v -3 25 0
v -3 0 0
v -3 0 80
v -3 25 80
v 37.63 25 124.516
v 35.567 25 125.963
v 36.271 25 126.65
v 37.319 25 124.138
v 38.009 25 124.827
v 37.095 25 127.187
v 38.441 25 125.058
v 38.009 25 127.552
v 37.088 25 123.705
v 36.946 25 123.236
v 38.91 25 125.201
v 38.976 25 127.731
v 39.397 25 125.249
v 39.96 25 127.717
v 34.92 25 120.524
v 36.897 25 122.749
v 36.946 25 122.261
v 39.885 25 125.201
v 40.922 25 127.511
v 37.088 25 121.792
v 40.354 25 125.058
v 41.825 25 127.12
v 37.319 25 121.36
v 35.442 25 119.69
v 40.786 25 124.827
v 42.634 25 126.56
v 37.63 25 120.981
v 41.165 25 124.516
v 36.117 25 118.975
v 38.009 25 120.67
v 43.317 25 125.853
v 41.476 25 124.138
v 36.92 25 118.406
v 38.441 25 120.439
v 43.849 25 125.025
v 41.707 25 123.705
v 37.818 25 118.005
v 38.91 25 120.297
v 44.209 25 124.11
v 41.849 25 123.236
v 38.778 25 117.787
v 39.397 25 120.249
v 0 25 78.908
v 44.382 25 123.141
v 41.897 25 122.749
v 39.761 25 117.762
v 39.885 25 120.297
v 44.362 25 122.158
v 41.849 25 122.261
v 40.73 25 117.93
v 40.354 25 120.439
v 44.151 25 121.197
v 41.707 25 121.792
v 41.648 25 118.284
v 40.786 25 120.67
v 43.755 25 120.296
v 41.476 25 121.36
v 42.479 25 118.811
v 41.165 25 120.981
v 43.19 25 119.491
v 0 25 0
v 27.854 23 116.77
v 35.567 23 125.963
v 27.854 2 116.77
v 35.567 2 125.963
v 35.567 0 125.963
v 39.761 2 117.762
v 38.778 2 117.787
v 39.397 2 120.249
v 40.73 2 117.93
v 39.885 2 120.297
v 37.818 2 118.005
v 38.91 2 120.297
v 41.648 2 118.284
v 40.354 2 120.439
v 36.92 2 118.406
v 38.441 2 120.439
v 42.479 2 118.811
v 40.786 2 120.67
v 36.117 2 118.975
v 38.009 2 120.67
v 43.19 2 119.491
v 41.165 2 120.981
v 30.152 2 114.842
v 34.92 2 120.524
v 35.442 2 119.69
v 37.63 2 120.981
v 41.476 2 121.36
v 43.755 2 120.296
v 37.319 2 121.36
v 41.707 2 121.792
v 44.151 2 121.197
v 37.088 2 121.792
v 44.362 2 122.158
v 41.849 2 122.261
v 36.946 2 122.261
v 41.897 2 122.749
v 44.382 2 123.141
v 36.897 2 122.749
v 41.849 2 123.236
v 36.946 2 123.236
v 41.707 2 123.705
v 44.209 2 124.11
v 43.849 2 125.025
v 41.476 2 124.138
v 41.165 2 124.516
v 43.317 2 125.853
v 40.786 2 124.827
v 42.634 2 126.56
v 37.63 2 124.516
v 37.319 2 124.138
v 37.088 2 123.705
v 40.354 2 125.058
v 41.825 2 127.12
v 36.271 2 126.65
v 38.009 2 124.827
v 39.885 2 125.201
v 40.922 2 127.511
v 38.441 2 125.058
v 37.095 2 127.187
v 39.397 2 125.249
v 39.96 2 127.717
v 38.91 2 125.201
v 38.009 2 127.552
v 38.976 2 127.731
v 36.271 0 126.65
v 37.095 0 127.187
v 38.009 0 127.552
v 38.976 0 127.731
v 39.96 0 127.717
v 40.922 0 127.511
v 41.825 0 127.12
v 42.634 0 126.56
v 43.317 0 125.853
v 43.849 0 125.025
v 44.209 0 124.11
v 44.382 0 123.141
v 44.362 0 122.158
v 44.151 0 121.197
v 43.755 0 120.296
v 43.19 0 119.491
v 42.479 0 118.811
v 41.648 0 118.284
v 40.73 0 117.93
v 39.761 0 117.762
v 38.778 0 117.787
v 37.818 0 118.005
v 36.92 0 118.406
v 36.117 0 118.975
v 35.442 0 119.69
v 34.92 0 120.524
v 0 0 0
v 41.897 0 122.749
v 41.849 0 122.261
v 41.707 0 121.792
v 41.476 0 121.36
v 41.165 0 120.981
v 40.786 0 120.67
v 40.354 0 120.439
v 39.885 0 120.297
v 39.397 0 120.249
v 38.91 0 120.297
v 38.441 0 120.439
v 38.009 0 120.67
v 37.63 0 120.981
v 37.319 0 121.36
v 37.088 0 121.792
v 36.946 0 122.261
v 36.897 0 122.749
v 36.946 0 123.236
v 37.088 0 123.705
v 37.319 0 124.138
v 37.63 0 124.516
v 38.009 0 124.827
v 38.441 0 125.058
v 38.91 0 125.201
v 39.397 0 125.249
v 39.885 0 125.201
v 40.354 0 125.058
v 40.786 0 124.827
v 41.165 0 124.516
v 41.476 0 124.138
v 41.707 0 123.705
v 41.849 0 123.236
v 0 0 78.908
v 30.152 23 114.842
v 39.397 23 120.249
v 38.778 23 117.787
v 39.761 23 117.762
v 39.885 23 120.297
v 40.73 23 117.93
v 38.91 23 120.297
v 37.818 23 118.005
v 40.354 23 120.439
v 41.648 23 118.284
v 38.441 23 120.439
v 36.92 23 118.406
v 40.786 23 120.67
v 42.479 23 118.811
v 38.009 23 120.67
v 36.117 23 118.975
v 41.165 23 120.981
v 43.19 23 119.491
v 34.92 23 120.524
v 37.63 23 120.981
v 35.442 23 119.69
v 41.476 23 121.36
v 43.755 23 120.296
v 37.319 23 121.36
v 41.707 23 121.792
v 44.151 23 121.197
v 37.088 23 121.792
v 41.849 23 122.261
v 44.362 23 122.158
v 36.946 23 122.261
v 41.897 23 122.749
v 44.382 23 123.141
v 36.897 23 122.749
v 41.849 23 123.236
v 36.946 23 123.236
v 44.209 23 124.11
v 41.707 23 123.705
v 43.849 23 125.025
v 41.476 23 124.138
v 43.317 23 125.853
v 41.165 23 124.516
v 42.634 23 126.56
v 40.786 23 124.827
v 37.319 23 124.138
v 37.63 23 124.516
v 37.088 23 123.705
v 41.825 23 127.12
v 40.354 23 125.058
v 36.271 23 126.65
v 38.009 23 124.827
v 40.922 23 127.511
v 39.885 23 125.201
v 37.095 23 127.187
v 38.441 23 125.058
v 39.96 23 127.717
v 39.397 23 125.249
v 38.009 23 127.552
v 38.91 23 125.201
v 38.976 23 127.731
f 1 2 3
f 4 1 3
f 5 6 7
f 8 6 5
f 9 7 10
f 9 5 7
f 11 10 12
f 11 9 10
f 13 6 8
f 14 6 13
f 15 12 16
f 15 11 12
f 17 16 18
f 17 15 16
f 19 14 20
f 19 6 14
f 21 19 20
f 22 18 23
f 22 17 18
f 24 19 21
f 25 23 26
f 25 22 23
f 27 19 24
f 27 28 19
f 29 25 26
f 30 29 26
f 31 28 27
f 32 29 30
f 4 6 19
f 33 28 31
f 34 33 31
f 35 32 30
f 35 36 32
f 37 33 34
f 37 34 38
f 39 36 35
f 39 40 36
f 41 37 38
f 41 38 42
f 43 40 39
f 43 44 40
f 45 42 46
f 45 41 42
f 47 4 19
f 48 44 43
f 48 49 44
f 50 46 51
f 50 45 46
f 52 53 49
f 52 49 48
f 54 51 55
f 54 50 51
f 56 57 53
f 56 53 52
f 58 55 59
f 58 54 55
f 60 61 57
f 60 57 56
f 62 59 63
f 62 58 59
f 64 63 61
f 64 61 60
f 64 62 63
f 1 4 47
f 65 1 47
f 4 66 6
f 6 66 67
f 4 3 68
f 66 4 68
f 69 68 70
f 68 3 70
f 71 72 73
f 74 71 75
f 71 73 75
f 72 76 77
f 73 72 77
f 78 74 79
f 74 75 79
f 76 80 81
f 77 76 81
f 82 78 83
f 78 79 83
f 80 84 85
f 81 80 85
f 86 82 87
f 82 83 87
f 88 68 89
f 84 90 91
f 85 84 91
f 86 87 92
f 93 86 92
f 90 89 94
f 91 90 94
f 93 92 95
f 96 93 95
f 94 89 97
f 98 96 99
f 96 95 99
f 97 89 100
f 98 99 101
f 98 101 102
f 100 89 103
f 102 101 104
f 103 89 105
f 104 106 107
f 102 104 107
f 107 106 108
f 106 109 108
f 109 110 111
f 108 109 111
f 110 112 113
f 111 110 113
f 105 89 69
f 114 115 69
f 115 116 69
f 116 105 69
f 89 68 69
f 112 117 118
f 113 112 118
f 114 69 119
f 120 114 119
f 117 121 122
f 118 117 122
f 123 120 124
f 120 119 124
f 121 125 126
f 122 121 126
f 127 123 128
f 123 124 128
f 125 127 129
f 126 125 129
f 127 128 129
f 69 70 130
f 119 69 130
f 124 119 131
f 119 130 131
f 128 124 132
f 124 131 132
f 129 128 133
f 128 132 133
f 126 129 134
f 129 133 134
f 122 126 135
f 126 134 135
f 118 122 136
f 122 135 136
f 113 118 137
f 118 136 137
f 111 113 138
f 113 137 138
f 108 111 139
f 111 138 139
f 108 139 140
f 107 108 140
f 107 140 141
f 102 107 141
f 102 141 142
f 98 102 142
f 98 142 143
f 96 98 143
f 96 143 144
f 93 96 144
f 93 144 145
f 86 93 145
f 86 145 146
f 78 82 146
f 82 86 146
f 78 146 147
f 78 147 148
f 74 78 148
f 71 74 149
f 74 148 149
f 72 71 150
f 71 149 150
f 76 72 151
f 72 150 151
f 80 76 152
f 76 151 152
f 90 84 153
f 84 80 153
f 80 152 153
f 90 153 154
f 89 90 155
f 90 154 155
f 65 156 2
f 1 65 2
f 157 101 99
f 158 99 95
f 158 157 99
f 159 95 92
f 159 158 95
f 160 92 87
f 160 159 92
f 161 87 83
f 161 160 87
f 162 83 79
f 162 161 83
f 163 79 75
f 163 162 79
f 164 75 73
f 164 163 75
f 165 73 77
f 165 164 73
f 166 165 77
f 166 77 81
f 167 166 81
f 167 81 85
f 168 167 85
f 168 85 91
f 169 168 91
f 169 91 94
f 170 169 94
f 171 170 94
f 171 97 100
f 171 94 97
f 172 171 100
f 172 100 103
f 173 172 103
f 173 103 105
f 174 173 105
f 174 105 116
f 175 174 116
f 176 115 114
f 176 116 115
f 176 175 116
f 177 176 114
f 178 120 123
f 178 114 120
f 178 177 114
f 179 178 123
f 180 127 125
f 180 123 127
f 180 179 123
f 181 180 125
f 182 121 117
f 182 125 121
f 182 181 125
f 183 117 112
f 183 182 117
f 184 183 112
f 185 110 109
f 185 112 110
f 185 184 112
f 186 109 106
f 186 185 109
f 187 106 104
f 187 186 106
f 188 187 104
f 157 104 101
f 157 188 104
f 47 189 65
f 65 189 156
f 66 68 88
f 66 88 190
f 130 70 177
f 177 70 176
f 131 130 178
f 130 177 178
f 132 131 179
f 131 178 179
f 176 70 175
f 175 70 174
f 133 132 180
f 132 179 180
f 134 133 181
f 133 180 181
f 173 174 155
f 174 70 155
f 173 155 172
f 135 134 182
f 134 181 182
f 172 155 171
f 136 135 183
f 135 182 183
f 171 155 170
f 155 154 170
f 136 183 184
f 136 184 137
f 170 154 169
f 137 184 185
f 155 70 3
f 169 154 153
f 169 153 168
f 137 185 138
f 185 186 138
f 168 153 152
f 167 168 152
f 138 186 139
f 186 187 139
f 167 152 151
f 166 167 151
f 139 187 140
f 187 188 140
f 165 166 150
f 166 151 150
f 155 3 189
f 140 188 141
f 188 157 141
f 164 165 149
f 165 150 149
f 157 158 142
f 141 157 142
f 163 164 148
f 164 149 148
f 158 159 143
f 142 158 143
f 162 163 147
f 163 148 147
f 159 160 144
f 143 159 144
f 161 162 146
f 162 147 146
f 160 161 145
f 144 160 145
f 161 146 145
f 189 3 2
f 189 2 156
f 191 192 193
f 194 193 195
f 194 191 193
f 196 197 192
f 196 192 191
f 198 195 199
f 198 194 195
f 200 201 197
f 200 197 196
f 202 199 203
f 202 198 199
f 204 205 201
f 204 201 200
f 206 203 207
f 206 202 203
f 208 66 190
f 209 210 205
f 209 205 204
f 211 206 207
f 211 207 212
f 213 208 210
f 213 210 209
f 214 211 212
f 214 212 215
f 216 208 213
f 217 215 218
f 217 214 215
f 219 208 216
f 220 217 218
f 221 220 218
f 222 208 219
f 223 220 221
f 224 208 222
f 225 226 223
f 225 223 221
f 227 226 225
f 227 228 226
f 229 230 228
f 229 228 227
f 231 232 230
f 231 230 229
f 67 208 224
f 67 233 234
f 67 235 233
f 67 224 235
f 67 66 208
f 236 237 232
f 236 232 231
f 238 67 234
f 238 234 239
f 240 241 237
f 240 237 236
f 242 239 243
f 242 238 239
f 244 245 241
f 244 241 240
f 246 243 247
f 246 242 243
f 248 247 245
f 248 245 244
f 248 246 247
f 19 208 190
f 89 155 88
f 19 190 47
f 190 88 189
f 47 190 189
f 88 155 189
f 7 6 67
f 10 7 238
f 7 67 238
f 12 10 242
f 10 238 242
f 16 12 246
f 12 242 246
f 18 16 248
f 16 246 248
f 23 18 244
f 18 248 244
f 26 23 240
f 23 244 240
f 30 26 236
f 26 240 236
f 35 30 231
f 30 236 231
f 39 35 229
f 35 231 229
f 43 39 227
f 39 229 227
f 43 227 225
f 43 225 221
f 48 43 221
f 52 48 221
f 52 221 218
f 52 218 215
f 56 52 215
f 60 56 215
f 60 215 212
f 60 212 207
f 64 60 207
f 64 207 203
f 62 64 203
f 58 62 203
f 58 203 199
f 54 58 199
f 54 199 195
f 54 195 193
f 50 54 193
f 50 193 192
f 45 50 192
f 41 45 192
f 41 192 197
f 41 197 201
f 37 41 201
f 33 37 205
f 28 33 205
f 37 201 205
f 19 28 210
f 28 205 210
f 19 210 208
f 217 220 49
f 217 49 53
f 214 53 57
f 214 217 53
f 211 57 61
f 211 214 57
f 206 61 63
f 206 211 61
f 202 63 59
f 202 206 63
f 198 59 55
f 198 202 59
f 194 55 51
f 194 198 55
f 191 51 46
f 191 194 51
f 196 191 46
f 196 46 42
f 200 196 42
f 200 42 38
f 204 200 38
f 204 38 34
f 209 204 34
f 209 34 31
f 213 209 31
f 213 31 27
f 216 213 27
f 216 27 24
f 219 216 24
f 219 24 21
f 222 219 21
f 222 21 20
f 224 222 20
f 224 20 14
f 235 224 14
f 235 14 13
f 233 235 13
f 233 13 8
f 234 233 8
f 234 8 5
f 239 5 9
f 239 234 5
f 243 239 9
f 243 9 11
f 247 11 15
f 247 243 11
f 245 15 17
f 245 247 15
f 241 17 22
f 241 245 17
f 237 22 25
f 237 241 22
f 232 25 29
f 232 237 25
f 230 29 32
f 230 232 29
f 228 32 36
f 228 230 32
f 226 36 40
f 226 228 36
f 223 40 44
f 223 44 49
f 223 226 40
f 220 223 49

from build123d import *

# Parameters (mm, degrees)
ESQUISSE1_R      = 2.5
EXTRUSION1_DEPTH = 25
ESQUISSE2_W      = 30
ESQUISSE2_H      = 21
EXTRUSION2_DEPTH = 88.731584025


with BuildPart() as part:
    # Esquisse1 → Extrusion1 (new body)
    with BuildSketch(Plane(origin=(0, 0, 0), x_dir=(1, 0, 0), z_dir=(0, 1, 0))):
        with BuildLine():
            Line((0, 0), (-3, 0))
            Line((-3, 0), (-3, -80))
            Line((-3, -80), (35.567256581, -125.962666587))
            ThreePointArc((35.567256581, -125.962666587), (44.362418985, -122.157654154), (34.919767033, -120.523847112))
            Line((34.919767033, -120.523847112), (0, -78.908089297))
            Line((0, -78.908089297), (0, 0))
        make_face()
        with Locations((39.397478797, -122.748728539)):
            Circle(ESQUISSE1_R, mode=Mode.SUBTRACT)
    extrude(amount=EXTRUSION1_DEPTH)

    # Esquisse2 → Extrusion2 (cut, through all)
    with BuildSketch(Plane(origin=(-41.152782387, 0, 34.531284523), x_dir=(0.64278761, 0, 0.766044443), z_dir=(-0.766044443, 0, 0.64278761))):
        with Locations((122.35519262, 12.5)):
            Rectangle(ESQUISSE2_W, ESQUISSE2_H)
    extrude(amount=-EXTRUSION2_DEPTH, mode=Mode.SUBTRACT)


solid = part.part
